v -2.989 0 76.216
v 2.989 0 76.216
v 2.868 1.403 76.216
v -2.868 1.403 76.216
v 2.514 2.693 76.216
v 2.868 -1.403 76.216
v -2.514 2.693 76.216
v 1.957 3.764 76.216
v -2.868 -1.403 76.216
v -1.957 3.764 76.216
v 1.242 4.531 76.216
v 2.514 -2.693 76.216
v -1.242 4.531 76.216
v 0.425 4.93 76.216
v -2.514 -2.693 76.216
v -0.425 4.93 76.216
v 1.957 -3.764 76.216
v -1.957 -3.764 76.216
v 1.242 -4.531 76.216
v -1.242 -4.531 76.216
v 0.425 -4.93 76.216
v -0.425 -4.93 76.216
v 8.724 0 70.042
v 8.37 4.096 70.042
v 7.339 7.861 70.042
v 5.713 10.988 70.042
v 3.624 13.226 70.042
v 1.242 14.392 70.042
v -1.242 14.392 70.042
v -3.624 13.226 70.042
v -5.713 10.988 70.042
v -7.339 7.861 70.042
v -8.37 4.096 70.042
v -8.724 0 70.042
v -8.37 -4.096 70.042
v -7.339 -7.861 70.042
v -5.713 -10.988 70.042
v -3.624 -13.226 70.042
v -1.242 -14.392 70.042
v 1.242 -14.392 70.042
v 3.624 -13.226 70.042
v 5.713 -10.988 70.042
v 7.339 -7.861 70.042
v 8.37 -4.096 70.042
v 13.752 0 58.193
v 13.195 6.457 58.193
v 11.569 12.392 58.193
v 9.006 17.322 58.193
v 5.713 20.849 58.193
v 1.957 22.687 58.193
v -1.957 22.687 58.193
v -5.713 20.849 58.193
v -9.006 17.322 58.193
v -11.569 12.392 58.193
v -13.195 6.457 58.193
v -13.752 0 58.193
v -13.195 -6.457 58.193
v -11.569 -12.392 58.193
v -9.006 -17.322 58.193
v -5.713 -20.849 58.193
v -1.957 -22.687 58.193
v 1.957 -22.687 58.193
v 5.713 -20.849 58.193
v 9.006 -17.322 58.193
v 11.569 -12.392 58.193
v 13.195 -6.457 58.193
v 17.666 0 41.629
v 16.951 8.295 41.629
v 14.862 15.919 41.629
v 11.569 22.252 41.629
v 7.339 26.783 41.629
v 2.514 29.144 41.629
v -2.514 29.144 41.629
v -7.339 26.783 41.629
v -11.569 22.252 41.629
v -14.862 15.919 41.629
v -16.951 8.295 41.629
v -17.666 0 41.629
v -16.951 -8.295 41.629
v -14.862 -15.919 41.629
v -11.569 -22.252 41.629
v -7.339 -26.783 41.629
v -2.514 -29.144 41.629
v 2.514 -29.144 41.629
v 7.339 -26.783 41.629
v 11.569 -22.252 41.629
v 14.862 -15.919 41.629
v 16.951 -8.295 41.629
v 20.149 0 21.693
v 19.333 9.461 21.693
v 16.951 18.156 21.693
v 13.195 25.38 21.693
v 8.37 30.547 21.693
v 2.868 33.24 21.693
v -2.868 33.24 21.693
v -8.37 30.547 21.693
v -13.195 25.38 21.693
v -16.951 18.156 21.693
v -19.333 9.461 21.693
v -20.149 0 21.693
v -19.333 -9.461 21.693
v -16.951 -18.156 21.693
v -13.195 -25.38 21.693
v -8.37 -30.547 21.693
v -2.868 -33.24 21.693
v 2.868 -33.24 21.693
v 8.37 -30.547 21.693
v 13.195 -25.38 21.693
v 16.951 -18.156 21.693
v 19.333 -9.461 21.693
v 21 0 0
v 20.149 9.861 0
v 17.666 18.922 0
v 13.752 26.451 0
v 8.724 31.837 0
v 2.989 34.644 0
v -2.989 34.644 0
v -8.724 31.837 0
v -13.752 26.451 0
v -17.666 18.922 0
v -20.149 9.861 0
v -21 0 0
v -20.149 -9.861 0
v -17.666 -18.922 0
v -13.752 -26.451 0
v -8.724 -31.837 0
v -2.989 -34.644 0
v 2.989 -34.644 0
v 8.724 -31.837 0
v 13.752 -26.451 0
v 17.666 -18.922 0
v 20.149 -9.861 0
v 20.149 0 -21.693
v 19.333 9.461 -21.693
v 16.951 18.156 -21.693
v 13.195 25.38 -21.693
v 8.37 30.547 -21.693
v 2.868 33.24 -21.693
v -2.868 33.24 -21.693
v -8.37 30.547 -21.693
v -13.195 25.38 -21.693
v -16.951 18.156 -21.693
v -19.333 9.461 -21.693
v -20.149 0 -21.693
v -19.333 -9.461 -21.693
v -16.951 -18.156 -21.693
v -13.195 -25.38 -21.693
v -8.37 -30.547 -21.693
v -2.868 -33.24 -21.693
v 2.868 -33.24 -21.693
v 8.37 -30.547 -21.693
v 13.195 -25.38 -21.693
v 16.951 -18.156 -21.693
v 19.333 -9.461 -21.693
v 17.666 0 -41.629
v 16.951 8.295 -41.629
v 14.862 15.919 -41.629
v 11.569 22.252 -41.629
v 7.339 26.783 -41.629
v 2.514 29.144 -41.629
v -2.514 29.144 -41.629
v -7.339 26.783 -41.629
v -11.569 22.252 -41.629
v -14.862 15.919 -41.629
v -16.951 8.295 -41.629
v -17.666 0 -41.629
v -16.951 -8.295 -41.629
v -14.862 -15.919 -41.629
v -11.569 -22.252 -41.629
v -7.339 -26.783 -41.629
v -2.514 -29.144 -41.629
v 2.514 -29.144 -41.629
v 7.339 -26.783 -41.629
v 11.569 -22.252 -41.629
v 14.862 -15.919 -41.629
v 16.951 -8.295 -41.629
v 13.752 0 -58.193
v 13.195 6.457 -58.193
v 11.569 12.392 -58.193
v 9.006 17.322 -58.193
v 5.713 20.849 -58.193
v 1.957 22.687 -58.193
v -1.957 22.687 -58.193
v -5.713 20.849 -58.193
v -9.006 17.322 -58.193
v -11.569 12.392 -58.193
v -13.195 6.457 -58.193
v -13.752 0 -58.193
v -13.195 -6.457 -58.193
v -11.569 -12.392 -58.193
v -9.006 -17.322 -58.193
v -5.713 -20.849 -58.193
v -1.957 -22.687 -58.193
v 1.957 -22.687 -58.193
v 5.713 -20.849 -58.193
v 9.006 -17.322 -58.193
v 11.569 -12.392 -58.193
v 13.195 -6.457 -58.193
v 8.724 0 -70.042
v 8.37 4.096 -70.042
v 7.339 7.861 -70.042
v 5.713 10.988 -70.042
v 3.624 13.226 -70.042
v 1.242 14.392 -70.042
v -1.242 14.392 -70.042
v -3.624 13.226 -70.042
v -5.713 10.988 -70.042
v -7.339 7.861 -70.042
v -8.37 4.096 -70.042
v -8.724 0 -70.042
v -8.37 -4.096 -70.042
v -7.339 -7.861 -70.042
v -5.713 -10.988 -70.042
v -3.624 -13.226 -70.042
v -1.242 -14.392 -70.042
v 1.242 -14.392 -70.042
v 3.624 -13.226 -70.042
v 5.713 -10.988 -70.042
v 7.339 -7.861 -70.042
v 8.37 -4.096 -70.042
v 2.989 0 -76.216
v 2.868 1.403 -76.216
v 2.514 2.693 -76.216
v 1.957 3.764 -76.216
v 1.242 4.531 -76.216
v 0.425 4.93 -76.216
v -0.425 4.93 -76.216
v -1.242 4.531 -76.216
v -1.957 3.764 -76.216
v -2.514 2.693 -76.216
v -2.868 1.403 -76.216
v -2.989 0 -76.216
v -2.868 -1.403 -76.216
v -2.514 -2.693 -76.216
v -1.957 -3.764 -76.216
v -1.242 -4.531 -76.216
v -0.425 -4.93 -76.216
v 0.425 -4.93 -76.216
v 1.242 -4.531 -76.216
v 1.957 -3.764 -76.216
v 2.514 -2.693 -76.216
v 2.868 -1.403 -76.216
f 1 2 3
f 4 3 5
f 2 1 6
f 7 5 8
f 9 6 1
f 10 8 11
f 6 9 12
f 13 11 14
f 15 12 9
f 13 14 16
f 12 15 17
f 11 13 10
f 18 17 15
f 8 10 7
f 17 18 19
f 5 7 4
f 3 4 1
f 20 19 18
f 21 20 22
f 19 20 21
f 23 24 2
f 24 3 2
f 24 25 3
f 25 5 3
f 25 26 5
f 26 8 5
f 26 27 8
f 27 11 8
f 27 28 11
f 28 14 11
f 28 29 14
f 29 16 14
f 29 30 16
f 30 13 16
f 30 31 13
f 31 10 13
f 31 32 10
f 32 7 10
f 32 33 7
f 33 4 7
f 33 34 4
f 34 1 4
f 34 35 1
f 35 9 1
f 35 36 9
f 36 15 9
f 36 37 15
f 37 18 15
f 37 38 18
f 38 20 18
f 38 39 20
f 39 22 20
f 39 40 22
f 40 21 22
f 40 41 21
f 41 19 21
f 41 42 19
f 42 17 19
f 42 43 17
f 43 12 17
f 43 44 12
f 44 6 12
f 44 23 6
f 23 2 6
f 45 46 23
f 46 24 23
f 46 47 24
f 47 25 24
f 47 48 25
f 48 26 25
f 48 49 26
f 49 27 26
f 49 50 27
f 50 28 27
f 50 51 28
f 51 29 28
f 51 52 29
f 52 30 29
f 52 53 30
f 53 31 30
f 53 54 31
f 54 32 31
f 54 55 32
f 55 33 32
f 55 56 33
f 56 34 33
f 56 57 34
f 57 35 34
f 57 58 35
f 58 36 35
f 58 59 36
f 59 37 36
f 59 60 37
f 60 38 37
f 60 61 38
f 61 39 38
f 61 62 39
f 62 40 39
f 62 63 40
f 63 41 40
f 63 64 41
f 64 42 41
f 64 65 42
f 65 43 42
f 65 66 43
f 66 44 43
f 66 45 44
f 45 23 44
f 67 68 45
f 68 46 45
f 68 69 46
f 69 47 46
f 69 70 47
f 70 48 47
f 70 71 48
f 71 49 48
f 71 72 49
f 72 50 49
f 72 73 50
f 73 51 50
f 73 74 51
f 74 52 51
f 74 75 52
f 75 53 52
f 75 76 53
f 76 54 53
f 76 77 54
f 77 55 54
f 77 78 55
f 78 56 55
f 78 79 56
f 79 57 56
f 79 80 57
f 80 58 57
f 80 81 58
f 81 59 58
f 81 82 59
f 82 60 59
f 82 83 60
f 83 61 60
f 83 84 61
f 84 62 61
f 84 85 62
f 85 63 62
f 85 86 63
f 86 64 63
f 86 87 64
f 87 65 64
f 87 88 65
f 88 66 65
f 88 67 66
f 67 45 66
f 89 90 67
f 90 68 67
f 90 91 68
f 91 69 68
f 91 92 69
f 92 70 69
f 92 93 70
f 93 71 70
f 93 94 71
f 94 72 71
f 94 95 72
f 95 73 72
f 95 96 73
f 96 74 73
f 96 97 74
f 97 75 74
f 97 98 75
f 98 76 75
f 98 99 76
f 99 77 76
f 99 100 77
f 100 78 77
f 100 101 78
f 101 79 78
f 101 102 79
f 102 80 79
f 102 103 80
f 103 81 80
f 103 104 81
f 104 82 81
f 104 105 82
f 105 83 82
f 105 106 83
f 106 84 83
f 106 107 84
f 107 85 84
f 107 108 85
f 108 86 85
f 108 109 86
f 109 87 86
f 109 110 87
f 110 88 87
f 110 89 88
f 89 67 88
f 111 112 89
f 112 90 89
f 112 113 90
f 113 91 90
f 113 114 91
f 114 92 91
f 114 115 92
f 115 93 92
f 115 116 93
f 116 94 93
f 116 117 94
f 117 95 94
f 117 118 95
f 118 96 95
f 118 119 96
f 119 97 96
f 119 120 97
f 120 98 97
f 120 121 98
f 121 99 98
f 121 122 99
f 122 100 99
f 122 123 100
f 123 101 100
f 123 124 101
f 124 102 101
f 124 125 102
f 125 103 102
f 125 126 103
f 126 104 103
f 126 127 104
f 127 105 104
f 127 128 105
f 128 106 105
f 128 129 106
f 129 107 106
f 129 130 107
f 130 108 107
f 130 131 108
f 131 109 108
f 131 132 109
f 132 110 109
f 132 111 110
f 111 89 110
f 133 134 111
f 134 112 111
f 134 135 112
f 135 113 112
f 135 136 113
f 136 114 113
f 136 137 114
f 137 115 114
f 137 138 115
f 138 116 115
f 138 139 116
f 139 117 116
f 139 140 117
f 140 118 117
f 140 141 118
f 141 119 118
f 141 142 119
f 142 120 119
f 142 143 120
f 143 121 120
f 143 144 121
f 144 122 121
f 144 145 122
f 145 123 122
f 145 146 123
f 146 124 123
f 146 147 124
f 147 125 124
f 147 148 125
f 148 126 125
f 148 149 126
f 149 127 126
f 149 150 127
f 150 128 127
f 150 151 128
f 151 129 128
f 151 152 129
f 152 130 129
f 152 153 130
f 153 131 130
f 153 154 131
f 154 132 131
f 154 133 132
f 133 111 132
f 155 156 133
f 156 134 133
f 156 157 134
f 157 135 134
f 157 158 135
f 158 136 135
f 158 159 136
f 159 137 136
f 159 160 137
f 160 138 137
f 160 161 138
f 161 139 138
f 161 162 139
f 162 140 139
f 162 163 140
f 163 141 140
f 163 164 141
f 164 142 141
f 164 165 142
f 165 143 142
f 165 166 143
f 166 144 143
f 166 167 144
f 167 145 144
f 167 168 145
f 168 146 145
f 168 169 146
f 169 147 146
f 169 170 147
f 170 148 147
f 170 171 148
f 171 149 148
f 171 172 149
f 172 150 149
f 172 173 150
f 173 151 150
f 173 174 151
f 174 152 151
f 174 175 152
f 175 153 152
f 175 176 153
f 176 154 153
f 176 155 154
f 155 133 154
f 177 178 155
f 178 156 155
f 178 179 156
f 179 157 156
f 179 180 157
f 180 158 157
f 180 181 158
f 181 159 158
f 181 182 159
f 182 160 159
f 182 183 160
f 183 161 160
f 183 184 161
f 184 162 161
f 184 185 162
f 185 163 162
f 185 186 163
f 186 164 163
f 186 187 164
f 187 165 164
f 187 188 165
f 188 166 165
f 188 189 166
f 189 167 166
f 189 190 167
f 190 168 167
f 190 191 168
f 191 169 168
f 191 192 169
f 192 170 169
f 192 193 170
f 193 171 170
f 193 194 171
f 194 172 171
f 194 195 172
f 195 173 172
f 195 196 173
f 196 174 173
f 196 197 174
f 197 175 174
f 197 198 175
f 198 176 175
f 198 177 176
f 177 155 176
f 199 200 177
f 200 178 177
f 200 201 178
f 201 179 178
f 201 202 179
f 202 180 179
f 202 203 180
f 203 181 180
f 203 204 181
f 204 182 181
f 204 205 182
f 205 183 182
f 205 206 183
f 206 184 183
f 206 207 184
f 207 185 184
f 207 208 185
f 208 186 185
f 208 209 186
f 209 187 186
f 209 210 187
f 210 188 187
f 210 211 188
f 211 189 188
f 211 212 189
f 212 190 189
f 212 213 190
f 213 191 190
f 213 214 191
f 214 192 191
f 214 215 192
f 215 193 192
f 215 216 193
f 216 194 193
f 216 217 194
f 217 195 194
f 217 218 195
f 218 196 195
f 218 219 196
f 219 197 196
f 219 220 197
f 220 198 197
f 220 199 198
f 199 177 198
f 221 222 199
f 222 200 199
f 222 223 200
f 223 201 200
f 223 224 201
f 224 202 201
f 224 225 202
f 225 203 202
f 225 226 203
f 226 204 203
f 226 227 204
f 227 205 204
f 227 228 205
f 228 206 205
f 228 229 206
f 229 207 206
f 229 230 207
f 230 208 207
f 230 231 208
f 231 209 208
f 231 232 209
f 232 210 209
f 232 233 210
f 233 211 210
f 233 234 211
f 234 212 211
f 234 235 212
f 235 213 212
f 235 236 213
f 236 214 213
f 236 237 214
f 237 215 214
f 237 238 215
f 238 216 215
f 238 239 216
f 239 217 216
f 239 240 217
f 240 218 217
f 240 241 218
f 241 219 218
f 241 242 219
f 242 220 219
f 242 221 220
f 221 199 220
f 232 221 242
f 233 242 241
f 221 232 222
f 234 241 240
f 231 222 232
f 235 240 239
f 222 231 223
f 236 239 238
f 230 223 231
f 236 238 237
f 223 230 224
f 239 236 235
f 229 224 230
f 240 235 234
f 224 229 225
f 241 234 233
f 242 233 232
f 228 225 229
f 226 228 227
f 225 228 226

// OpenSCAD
// Generated by SolidPython 1.0.1 on 2020-07-29 00:46:45


scale(v = [3, 5, 11]) {
	sphere(r = 7);
}
/***********************************************
*********      SolidPython code:      **********
************************************************
 
# import packages: SolidPython
from solid import *
from solid.utils import *
from itertools import chain, combinations, permutations


class Resize:

    def __init__(self, scad_file):
        self.scad_file = scad_file
        #self.scad_file = import_scad(scad_file)
        # cone/cylinder param:
        self.r1 = 0
        self.r2 = 0
        self.h = 0
        # rectangular prism param:
        self.w = 0
        self.l = 0
        # ellipse param:
        self.r = 0

    # import OpenScad code (file name corresponds to shape)


    # classify shape + parameters
    def assign(self, param1, param2, param3):
        if self.scad_file == 'cone.scad':
            self.r1 = param1
            self.r2 = param2
            self.h = param3
        elif self.scad_file == 'cylinder.scad':
            self.r1 = param1
            self.r2 = param2
            self.h = param3
        elif self.scad_file == 'rectangularPrism.scad':
            self.h = param1
            self.l = param2
            self.w = param3
        else:
            self.r = param1
            self.h = param2

    # resize parameters
    def iterate(self):
        x = range(3, 20, 2)
        i = 1
        if self.scad_file == 'cone.scad':
            tempList = list(permutations(x, 2))
            for temp in tempList:
                param1 = temp[0]
                param2 = temp[1]
                filepath = 'produced_scad_files/' + 'cone' + str(param1) + '_' + str(param2) + '_' + '.scad'
                scad_render_to_file(cylinder(h=param1, r1=param2, r2=0), filepath)

        elif self.scad_file == 'cylinder.scad':
            tempList = list(permutations(x, 3))
            for temp in tempList:
                param1 = temp[0]
                param2 = temp[1]
                filepath = 'produced_scad_files/' + 'cylinder' + str(param1) + '_' + str(param2) + '_' + '.scad'
                scad_render_to_file(cylinder(h=param1, r1=param2, r2=param2), filepath)

        elif self.scad_file == 'rectangularPrism.scad':
            tempList = list(permutations(x, 3))
            for temp in tempList:
                param1 = temp[0]
                param2 = temp[1]
                param3 = temp[2]
                filepath = 'produced_scad_files/' + 'rectangularPrism' + str(param1) + '_' + str(param2) + '_' + str(
                    param3) + '.scad'
                scad_render_to_file(cube(size=(param1, param2, param3)), filepath)

        elif self.scad_file == 'ellipse.scad':
            tempList = list(permutations(x, 4))
            for temp in tempList:
                param1 = temp[0]
                param2 = temp[1]
                param3 = temp[2]
                param4 = temp[3]
                filepath = 'produced_scad_files/' + 'ellipse' + str(param1) + '_' + str(param2) + '_' + str(param3) + '_' + str(param4) + '.scad'
                scad_render_to_file(scale([param1, param2, param3])(sphere(r=param4)), filepath)

    def render_to_scadfile(self):
        scad_render_to_file(scad, 'example.scad') 
 
************************************************/
